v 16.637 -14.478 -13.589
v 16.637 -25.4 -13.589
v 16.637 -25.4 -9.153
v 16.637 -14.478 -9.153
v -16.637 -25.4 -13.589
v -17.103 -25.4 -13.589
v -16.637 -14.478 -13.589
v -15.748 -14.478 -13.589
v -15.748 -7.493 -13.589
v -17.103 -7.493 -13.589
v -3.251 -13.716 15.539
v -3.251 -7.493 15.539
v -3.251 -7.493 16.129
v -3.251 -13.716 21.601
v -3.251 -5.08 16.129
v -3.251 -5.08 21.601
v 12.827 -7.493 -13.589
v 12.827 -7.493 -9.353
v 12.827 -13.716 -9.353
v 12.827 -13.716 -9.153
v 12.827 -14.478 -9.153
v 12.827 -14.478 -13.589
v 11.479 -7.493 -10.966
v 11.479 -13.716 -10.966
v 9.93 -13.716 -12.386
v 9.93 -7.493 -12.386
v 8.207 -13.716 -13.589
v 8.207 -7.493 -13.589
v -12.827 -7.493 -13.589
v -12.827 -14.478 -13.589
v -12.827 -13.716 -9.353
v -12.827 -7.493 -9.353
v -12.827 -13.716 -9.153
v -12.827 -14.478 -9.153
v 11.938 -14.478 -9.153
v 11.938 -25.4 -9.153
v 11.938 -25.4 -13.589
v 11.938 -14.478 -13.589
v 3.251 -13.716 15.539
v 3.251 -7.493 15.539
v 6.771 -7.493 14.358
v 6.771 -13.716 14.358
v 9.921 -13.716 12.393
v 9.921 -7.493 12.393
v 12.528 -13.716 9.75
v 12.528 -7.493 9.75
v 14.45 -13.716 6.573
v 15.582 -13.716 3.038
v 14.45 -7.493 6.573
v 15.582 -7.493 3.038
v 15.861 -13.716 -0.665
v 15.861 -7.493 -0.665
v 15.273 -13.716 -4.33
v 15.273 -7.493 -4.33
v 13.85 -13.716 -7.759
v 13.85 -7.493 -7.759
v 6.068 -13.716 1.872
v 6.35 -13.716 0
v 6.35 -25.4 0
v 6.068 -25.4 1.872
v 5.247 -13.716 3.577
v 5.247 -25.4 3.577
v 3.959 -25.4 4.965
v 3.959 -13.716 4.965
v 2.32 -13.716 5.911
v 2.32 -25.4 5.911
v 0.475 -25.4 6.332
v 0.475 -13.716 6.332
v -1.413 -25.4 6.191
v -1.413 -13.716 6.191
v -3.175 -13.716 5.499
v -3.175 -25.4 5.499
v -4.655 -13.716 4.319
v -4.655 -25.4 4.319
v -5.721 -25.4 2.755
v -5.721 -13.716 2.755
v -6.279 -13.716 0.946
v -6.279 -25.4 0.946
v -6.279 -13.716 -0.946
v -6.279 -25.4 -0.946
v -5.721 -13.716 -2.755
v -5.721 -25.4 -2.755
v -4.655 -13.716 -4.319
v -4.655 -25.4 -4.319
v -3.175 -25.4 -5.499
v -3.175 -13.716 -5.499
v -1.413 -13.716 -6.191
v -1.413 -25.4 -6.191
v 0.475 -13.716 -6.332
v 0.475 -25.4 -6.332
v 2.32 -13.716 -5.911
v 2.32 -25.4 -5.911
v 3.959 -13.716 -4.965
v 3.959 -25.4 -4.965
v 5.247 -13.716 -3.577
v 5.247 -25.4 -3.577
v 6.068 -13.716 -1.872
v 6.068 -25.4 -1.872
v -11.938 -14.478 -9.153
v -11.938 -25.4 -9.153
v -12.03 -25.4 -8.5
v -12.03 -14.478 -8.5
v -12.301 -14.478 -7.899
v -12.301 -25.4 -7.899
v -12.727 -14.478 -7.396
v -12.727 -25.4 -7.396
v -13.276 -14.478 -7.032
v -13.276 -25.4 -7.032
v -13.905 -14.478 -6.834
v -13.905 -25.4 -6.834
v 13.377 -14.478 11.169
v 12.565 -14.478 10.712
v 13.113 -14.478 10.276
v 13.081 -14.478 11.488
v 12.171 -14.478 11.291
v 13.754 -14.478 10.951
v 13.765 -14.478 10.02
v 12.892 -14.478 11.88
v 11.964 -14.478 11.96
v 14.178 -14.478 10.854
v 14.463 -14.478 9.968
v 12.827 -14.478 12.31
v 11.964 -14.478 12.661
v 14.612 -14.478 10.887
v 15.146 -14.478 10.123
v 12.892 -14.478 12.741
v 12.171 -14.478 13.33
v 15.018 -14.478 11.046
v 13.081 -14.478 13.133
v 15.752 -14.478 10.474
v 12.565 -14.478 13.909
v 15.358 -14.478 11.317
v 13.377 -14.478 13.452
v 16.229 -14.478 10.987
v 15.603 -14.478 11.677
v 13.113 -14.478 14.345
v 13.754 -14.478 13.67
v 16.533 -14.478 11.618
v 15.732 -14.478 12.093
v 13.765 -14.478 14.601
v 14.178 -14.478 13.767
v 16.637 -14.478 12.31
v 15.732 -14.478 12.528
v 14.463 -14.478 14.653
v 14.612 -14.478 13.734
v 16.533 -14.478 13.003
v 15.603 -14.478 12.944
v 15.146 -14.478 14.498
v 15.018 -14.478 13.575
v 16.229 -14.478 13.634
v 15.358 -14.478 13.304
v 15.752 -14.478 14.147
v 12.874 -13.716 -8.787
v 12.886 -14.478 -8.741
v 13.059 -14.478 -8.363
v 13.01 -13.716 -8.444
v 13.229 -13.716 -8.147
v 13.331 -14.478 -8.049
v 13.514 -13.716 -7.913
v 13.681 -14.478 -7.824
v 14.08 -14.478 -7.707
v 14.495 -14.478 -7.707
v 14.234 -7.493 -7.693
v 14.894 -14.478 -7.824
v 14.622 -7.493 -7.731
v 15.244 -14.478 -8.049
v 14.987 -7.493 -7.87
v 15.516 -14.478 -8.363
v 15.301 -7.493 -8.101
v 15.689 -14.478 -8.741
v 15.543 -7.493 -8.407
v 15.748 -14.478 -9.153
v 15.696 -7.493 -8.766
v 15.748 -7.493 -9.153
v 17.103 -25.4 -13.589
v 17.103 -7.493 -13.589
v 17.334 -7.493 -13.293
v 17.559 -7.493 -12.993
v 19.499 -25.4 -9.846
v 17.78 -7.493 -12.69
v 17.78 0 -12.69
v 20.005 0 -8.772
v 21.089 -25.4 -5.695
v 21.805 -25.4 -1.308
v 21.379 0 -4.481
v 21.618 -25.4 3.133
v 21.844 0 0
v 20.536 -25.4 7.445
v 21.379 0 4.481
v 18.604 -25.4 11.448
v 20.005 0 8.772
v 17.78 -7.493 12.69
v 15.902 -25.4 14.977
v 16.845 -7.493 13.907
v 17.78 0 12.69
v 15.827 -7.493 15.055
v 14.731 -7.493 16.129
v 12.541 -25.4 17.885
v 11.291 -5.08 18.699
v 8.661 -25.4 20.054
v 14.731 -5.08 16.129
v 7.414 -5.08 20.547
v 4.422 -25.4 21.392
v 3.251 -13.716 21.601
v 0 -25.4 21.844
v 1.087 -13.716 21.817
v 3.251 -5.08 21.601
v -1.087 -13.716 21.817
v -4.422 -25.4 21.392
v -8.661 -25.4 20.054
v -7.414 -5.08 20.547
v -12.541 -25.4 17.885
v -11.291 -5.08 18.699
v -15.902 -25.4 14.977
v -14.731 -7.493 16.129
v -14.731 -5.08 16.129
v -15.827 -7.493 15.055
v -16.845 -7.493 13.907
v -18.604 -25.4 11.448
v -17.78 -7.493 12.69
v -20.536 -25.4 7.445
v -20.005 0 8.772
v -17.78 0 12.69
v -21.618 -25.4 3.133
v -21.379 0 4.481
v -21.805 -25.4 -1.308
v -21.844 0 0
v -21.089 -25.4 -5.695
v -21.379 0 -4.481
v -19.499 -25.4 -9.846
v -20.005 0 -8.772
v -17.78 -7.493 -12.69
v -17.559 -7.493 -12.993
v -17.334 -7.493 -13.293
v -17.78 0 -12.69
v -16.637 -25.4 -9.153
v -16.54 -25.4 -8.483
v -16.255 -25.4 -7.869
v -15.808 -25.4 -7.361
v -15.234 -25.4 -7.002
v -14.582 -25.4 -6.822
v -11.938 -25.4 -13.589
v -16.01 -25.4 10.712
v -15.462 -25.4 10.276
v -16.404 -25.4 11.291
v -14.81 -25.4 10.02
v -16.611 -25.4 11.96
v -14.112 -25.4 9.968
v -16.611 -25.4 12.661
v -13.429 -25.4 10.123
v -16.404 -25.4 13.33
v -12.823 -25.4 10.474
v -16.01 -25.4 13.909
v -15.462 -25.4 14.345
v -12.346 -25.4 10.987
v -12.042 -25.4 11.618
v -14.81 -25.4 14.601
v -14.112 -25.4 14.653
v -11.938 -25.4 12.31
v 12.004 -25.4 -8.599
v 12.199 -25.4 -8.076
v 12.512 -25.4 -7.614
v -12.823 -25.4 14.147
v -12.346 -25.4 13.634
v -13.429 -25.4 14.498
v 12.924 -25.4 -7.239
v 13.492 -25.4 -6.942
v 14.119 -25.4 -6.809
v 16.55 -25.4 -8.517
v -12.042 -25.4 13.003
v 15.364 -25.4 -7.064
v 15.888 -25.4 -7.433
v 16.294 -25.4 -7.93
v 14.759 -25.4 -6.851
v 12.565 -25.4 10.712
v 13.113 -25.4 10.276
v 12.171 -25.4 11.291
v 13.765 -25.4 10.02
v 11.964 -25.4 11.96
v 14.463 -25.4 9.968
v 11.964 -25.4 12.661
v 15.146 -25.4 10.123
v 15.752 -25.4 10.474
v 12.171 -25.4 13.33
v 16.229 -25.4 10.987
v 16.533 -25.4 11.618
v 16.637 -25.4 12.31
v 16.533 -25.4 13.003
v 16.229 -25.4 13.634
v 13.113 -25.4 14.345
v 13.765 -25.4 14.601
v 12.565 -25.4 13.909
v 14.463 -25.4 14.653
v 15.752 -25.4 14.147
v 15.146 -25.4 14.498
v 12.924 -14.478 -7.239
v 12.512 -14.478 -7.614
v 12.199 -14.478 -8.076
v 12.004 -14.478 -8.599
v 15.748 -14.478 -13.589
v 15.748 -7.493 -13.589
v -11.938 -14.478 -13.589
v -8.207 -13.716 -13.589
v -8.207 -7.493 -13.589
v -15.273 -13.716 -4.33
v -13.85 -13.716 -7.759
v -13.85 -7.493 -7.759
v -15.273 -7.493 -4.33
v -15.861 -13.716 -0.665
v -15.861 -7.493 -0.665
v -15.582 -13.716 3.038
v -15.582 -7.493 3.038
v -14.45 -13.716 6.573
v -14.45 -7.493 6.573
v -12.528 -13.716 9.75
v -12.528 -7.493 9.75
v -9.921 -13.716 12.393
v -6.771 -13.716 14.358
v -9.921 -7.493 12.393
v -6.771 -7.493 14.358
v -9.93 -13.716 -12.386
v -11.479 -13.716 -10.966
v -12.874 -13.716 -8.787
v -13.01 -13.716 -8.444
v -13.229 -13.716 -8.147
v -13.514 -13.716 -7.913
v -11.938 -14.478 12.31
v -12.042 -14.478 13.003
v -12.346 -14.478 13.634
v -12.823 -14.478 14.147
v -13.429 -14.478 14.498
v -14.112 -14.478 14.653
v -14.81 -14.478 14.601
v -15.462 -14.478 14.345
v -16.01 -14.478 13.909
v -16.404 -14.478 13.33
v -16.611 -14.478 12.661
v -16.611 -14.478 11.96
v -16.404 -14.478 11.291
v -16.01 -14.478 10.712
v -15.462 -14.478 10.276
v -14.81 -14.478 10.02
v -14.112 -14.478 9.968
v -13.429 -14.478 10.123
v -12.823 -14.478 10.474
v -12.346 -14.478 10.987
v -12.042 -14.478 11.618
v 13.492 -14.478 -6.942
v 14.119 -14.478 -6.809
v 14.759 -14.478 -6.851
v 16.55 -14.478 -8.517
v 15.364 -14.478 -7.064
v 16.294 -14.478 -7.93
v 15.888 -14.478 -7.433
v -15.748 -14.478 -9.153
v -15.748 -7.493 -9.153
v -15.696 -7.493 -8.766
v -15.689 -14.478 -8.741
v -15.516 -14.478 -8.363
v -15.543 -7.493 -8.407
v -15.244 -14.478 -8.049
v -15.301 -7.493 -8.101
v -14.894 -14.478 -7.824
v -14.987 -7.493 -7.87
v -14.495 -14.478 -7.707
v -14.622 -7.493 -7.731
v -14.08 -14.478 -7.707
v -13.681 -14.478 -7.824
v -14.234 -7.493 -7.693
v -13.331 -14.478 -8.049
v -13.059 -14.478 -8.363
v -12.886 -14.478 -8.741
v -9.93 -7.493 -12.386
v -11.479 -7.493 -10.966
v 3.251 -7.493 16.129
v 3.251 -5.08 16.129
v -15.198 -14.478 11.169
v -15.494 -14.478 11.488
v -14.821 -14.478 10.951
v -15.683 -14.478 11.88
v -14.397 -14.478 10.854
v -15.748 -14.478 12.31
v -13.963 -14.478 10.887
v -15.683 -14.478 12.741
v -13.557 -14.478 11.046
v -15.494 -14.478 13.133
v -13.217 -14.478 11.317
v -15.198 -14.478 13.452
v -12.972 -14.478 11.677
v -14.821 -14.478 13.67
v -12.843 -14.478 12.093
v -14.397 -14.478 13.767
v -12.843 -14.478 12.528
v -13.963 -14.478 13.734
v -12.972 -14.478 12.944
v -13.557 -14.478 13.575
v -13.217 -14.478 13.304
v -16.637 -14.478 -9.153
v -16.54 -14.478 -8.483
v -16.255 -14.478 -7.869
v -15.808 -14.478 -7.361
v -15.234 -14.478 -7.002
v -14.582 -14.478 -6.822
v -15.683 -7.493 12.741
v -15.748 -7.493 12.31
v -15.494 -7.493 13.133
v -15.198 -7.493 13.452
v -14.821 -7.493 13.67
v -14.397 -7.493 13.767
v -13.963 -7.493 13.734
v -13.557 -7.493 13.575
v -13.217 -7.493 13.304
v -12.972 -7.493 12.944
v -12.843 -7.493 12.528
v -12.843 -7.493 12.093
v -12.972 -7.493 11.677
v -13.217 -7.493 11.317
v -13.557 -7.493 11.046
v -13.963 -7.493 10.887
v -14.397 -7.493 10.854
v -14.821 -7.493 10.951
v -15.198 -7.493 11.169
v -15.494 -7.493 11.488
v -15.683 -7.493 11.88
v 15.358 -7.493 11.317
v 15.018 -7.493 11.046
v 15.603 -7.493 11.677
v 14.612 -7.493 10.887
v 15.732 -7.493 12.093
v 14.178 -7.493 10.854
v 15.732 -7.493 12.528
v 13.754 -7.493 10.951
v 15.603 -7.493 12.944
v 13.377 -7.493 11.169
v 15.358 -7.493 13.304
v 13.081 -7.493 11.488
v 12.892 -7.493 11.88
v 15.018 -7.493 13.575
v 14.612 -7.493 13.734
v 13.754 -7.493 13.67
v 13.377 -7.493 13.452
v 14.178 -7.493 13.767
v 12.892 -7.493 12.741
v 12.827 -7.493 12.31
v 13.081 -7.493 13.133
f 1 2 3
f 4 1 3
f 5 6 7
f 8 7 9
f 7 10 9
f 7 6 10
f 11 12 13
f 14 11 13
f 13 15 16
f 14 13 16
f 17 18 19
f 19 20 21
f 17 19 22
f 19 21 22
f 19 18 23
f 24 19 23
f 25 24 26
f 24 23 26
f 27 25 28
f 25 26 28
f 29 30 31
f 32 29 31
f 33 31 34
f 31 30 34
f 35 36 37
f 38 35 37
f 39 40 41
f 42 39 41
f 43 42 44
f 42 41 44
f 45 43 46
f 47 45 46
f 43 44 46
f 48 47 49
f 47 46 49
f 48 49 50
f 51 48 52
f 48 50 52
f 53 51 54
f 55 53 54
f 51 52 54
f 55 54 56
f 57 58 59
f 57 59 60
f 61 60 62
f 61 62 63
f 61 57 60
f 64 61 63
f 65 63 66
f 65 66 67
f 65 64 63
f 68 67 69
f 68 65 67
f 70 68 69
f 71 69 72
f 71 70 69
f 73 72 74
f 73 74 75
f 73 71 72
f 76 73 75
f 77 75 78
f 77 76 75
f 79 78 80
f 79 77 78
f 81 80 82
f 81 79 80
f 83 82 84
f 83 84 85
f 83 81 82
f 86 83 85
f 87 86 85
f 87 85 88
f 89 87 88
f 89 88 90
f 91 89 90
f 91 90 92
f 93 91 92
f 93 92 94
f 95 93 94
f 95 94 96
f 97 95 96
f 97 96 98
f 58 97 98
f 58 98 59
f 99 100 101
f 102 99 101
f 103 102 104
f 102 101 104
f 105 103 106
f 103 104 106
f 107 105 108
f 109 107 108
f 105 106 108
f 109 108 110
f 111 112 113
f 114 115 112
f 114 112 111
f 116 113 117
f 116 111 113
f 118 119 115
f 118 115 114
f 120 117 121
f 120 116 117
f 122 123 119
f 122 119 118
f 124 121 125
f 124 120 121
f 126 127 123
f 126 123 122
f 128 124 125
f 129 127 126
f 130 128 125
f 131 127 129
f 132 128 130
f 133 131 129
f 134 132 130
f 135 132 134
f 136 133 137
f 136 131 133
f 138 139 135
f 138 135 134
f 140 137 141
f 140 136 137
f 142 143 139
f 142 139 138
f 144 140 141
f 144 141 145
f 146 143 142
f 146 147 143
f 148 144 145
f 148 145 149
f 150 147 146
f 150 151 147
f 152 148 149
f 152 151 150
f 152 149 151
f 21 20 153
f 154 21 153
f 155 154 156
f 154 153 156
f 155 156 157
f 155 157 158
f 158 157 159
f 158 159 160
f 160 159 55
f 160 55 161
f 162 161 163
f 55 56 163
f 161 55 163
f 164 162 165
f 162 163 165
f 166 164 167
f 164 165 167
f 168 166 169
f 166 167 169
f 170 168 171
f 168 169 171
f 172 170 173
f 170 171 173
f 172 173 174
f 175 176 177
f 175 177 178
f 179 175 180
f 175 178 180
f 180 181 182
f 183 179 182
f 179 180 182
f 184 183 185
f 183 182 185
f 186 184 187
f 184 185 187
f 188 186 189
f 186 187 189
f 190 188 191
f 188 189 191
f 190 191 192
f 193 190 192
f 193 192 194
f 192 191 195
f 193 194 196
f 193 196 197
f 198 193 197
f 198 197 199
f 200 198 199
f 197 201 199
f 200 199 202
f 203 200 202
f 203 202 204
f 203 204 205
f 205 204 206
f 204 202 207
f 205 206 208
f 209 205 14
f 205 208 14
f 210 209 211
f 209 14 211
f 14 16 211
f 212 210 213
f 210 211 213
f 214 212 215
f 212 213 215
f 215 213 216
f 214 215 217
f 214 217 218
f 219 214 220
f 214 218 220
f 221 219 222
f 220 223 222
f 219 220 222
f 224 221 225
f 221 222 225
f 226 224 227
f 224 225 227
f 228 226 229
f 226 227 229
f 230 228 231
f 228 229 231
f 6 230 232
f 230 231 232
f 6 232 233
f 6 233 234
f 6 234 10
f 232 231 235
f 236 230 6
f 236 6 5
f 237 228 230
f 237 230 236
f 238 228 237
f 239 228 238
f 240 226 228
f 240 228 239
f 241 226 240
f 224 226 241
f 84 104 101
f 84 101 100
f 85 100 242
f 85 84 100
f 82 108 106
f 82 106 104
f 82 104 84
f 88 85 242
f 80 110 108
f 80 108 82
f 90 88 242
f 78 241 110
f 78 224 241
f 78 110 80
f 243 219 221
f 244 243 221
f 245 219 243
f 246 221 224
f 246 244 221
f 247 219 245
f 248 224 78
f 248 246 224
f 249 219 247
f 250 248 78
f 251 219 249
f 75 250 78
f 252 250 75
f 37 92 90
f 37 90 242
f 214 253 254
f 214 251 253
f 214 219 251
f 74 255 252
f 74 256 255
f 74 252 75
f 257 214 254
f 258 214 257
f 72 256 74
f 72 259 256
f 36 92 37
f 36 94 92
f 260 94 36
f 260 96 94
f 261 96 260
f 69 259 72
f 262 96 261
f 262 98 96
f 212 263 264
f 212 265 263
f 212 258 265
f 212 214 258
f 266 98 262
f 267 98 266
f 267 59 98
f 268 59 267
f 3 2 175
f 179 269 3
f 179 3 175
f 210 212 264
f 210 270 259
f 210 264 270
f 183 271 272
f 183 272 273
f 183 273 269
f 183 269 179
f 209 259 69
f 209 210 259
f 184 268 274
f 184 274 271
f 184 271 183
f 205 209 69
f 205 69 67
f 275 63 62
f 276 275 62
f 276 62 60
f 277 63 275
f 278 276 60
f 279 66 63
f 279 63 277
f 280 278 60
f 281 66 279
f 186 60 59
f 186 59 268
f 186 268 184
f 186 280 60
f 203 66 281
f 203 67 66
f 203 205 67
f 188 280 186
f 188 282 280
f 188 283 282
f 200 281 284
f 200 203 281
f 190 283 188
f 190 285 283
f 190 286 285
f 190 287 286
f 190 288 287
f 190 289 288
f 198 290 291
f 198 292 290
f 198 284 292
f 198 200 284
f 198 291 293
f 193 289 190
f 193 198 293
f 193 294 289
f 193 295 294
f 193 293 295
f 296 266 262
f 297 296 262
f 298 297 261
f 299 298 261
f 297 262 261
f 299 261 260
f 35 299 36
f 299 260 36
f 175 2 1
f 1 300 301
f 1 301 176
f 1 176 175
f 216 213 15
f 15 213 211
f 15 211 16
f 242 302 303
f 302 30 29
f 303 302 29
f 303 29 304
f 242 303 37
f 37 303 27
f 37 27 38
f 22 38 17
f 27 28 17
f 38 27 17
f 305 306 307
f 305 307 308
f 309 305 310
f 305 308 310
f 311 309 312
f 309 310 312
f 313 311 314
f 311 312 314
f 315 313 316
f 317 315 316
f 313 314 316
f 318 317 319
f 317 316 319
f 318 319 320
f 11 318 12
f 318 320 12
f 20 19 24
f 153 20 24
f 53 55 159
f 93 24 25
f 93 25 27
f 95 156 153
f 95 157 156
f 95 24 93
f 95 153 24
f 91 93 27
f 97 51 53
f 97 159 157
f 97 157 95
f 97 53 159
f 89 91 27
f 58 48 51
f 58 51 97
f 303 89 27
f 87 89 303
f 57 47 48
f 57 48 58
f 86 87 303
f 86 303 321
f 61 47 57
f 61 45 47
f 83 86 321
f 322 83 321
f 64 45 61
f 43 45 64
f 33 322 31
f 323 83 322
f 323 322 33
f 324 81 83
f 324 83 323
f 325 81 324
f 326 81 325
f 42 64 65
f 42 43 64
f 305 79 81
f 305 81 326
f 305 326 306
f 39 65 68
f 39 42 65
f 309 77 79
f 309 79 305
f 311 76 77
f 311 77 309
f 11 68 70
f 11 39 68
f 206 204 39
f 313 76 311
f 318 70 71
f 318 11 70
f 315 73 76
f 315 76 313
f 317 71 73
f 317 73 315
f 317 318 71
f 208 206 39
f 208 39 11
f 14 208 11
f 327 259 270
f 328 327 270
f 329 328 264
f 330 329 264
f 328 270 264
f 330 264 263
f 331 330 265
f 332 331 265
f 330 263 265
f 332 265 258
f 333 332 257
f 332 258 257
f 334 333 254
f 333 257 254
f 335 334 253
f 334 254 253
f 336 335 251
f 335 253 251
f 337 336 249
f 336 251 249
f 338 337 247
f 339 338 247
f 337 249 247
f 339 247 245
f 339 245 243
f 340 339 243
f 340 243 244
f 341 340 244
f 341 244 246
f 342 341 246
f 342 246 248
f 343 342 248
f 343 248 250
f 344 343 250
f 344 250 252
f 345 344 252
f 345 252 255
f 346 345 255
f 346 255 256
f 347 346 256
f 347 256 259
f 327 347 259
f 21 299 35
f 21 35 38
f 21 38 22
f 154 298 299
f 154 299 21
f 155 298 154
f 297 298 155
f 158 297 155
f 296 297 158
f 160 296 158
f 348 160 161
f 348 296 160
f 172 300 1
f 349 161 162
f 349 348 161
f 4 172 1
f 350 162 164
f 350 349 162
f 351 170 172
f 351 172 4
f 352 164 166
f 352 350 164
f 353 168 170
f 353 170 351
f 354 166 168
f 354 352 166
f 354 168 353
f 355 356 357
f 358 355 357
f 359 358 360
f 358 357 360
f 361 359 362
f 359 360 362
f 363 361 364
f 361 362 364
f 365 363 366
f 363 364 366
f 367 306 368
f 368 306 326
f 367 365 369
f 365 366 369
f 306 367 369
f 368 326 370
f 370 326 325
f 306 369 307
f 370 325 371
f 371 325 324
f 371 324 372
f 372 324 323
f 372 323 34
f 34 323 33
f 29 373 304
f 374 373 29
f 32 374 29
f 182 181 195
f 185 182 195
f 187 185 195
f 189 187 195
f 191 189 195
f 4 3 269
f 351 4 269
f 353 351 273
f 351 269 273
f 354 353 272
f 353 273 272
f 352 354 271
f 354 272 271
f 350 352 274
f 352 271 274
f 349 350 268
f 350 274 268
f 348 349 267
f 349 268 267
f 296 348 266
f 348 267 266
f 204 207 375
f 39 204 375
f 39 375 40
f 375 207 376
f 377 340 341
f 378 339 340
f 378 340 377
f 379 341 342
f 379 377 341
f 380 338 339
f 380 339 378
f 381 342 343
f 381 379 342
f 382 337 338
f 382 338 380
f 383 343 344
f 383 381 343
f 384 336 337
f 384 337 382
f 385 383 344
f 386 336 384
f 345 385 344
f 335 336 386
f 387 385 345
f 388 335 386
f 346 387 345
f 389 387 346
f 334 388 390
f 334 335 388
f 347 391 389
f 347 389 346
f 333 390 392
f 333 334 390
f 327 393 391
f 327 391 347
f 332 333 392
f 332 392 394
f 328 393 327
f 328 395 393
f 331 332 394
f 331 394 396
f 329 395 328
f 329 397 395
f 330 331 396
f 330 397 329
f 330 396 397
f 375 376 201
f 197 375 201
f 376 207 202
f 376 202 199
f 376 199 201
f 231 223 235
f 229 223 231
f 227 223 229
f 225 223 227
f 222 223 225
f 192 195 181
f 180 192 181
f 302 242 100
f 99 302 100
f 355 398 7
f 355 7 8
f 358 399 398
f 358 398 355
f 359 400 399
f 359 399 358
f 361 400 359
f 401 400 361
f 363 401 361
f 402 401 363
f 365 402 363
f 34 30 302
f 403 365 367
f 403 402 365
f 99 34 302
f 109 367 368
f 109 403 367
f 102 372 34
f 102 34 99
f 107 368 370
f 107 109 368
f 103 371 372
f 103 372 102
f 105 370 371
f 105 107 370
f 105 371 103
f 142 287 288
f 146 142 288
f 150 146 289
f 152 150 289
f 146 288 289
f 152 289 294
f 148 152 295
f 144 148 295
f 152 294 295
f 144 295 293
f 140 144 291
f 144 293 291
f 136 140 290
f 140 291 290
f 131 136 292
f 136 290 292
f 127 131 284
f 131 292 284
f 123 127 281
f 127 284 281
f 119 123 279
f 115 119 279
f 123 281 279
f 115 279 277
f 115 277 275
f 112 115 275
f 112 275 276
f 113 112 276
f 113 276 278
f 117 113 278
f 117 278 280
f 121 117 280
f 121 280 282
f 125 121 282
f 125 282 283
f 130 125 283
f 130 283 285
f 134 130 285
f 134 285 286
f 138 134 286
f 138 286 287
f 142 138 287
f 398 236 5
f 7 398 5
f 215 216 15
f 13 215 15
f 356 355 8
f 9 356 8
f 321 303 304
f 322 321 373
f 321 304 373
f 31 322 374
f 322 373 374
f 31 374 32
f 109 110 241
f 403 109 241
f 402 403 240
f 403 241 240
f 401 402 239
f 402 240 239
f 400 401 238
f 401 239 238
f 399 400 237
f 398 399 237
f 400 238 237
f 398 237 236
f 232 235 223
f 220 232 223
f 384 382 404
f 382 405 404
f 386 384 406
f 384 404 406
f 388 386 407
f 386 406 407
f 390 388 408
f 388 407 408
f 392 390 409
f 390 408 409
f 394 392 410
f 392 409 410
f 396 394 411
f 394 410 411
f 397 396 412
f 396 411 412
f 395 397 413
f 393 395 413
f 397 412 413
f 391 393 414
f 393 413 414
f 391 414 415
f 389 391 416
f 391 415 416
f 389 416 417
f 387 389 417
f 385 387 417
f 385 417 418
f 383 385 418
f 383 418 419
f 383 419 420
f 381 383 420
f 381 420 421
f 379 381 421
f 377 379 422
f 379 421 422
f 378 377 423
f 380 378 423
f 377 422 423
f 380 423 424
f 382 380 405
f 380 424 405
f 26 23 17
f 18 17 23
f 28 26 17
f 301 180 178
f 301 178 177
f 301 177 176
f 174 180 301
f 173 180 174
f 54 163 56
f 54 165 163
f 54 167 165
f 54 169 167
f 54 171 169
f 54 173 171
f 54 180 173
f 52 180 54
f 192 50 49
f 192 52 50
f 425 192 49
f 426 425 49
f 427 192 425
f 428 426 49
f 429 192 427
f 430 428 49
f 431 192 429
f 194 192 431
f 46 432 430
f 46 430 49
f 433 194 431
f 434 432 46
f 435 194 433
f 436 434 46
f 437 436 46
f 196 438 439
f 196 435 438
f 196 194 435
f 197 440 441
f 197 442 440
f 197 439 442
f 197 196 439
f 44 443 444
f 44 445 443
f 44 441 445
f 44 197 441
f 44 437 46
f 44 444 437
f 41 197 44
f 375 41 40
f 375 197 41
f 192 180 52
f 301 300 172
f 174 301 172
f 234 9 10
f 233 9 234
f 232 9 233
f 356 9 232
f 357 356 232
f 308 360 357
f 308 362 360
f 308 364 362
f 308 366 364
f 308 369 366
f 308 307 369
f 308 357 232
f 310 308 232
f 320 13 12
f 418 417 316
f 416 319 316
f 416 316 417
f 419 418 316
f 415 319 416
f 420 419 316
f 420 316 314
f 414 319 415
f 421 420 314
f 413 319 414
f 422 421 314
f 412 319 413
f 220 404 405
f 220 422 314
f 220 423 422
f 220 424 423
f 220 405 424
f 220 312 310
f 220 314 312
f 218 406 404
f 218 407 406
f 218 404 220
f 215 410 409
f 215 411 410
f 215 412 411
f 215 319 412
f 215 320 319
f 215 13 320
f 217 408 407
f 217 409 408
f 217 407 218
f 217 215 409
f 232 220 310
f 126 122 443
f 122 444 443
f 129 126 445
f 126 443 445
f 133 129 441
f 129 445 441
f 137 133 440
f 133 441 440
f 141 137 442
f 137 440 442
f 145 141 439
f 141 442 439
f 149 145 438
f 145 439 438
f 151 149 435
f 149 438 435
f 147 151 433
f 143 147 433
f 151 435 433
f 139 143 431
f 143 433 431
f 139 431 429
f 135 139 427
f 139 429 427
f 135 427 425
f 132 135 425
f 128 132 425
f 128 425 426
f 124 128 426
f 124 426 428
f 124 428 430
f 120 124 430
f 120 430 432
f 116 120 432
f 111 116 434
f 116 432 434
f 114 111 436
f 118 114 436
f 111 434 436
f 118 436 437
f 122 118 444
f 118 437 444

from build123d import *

# Parameters (mm, degrees)
F0_R           = 6.35
F1_DEPTH       = 25.4
F2_R           = 6.35
F3_DEPTH       = 13.716
F5_DEPTH       = 7.493
F6_DEPTH       = 5.08
F8_D           = 2.921
F8_CBORE_D     = 4.699
F8_CBORE_DEPTH = 10.922
F9_DEPTH       = 10.922
F10_DEPTH      = 17.907


with BuildPart() as f1:
    # F0 (on Front) → F1 (new body)
    with BuildSketch(Plane.XZ):
        with BuildLine():
            Line((0, -13.589), (17.1026142738, -13.589))
            ThreePointArc((17.1026142738, -13.589), (0, 21.844), (-17.1026142738, -13.589))
            Line((-17.1026142738, -13.589), (0, -13.589))
        make_face()
        Circle(F0_R, mode=Mode.SUBTRACT)
    extrude(amount=F1_DEPTH)

    # F2 (on face) → F3 (cut)
    with BuildSketch(Plane(origin=(0, 0, 0), x_dir=(-1, 0, 0), z_dir=(0, 1, 0))):
        with BuildLine():
            Line((-3.2512, 21.6006952333), (-3.2512, 15.5385109827))
            ThreePointArc((-3.2512, 15.5385109827), (-15.6500961726, 2.6627269459), (-8.2069911661, -13.589))
            Line((-8.2069911661, -13.589), (8.2069911661, -13.589))
            ThreePointArc((8.2069911661, -13.589), (15.6500961726, 2.6627269459), (3.2512, 15.5385109827))
            Line((3.2512, 15.5385109827), (3.2512, 21.6006952333))
            ThreePointArc((3.2512, 21.6006952333), (0, 21.844), (-3.2512, 21.6006952333))
        make_face()
        Circle(F2_R, mode=Mode.SUBTRACT)
    extrude(amount=-F3_DEPTH, mode=Mode.SUBTRACT)

    # F4 (on face) → F5 (cut)
    with BuildSketch(Plane(origin=(0, 0, 0), x_dir=(-1, 0, 0), z_dir=(0, 1, 0))):
        with BuildLine():
            Line((-17.1026142738, -13.589), (-8.2069911661, -13.589))
            ThreePointArc((-8.2069911661, -13.589), (-15.6500961726, 2.6627269459), (-3.2512, 15.5385109827))
            Line((-3.2512, 15.5385109827), (-3.2512, 16.129))
            Line((-3.2512, 16.129), (-14.731452576, 16.129))
            ThreePointArc((-14.731452576, 16.129), (-16.3464246709, 14.4898149222), (-17.78, 12.6898359327))
            Line((-17.78, 12.6898359327), (-17.78, -12.6898359327))
            ThreePointArc((-17.78, -12.6898359327), (-17.44710058, -13.1437824598), (-17.1026142738, -13.589))
        make_face()
        with BuildLine():
            Line((-8.2069911661, -13.589), (0, -13.589))
            Line((0, -13.589), (17.78, -13.589))
            Line((17.78, -13.589), (17.78, 16.129))
            Line((17.78, 16.129), (-3.2512, 16.129))
            Line((-3.2512, 16.129), (-3.2512, 15.5385109827))
            ThreePointArc((-3.2512, 15.5385109827), (-15.6500961726, 2.6627269459), (-8.2069911661, -13.589))
        make_face()
    extrude(amount=-F5_DEPTH, mode=Mode.SUBTRACT)

    # F6 (cut): faces of the model
    f6_faces = [f1.faces().sort_by_distance(p)[0] for p in [
        (7.5018293791, 0, 18.2089166426),
        (-7.5018293791, 0, 18.2089166426),
    ]]
    extrude(f6_faces, amount=-F6_DEPTH, mode=Mode.SUBTRACT)

    # F8 (through all)
    with Locations(Plane.XZ.offset(25.4)):
        with Locations((-14.2875, -9.1525132509), (-14.2875, 12.3104867491), (14.2875, 12.3104867491), (14.2875, -9.1525132509)):
            CounterBoreHole(F8_D / 2, F8_CBORE_D / 2, F8_CBORE_DEPTH)

    # F7 (on face) → F9 (cut)
    with BuildSketch(Plane.XZ.offset(25.4)):
        with BuildLine():
            Line((-12.827, -13.589), (-11.938, -13.589))
            Line((-11.938, -13.589), (-11.938, -9.1525132509))
            ThreePointArc((-11.938, -9.1525132509), (-12.1990496422, -8.0761650949), (-12.9241888511, -7.239))
            Line((-12.9241888511, -7.239), (-13.6989384625, -7.239))
            ThreePointArc((-13.6989384625, -7.239), (-13.8035807397, -7.0374139258), (-13.9052567889, -6.8343155938))
            ThreePointArc((-13.9052567889, -6.8343155938), (-15.8077088385, -7.3611128665), (-16.637, -9.1525132509))
            Line((-16.637, -9.1525132509), (-16.637, -13.589))
            Line((-16.637, -13.589), (-15.748, -13.589))
            Line((-15.748, -13.589), (-15.748, -9.1525132509))
            ThreePointArc((-15.748, -9.1525132509), (-14.2875, -7.6920132509), (-12.827, -9.1525132509))
            Line((-12.827, -9.1525132509), (-12.827, -13.589))
        make_face()
        with BuildLine():
            ThreePointArc((12.827, -9.1525132509), (14.2875, -7.6920132509), (15.748, -9.1525132509))
            Line((15.748, -9.1525132509), (15.748, -13.589))
            Line((15.748, -13.589), (16.637, -13.589))
            Line((16.637, -13.589), (16.637, -9.1525132509))
            ThreePointArc((16.637, -9.1525132509), (15.8077088385, -7.3611128665), (13.9052567889, -6.8343155938))
            ThreePointArc((13.9052567889, -6.8343155938), (13.8035807397, -7.0374139258), (13.6989384625, -7.239))
            Line((13.6989384625, -7.239), (12.9241888511, -7.239))
            ThreePointArc((12.9241888511, -7.239), (12.1990496422, -8.0761650949), (11.938, -9.1525132509))
            Line((11.938, -9.1525132509), (11.938, -13.589))
            Line((11.938, -13.589), (12.827, -13.589))
            Line((12.827, -13.589), (12.827, -9.1525132509))
        make_face()
    extrude(amount=-F9_DEPTH, mode=Mode.SUBTRACT)

    # F7 (on face) → F10 (cut)
    with BuildSketch(Plane.XZ.offset(25.4)):
        with BuildLine():
            Line((-15.748, -13.589), (-12.827, -13.589))
            Line((-12.827, -13.589), (-12.827, -9.1525132509))
            ThreePointArc((-12.827, -9.1525132509), (-14.2875, -7.6920132509), (-15.748, -9.1525132509))
            Line((-15.748, -9.1525132509), (-15.748, -13.589))
        make_face()
        with BuildLine():
            Line((15.748, -13.589), (15.748, -9.1525132509))
            ThreePointArc((15.748, -9.1525132509), (14.2875, -7.6920132509), (12.827, -9.1525132509))
            Line((12.827, -9.1525132509), (12.827, -13.589))
            Line((12.827, -13.589), (15.748, -13.589))
        make_face()
    extrude(amount=-F10_DEPTH, mode=Mode.SUBTRACT)


solid = f1.part
